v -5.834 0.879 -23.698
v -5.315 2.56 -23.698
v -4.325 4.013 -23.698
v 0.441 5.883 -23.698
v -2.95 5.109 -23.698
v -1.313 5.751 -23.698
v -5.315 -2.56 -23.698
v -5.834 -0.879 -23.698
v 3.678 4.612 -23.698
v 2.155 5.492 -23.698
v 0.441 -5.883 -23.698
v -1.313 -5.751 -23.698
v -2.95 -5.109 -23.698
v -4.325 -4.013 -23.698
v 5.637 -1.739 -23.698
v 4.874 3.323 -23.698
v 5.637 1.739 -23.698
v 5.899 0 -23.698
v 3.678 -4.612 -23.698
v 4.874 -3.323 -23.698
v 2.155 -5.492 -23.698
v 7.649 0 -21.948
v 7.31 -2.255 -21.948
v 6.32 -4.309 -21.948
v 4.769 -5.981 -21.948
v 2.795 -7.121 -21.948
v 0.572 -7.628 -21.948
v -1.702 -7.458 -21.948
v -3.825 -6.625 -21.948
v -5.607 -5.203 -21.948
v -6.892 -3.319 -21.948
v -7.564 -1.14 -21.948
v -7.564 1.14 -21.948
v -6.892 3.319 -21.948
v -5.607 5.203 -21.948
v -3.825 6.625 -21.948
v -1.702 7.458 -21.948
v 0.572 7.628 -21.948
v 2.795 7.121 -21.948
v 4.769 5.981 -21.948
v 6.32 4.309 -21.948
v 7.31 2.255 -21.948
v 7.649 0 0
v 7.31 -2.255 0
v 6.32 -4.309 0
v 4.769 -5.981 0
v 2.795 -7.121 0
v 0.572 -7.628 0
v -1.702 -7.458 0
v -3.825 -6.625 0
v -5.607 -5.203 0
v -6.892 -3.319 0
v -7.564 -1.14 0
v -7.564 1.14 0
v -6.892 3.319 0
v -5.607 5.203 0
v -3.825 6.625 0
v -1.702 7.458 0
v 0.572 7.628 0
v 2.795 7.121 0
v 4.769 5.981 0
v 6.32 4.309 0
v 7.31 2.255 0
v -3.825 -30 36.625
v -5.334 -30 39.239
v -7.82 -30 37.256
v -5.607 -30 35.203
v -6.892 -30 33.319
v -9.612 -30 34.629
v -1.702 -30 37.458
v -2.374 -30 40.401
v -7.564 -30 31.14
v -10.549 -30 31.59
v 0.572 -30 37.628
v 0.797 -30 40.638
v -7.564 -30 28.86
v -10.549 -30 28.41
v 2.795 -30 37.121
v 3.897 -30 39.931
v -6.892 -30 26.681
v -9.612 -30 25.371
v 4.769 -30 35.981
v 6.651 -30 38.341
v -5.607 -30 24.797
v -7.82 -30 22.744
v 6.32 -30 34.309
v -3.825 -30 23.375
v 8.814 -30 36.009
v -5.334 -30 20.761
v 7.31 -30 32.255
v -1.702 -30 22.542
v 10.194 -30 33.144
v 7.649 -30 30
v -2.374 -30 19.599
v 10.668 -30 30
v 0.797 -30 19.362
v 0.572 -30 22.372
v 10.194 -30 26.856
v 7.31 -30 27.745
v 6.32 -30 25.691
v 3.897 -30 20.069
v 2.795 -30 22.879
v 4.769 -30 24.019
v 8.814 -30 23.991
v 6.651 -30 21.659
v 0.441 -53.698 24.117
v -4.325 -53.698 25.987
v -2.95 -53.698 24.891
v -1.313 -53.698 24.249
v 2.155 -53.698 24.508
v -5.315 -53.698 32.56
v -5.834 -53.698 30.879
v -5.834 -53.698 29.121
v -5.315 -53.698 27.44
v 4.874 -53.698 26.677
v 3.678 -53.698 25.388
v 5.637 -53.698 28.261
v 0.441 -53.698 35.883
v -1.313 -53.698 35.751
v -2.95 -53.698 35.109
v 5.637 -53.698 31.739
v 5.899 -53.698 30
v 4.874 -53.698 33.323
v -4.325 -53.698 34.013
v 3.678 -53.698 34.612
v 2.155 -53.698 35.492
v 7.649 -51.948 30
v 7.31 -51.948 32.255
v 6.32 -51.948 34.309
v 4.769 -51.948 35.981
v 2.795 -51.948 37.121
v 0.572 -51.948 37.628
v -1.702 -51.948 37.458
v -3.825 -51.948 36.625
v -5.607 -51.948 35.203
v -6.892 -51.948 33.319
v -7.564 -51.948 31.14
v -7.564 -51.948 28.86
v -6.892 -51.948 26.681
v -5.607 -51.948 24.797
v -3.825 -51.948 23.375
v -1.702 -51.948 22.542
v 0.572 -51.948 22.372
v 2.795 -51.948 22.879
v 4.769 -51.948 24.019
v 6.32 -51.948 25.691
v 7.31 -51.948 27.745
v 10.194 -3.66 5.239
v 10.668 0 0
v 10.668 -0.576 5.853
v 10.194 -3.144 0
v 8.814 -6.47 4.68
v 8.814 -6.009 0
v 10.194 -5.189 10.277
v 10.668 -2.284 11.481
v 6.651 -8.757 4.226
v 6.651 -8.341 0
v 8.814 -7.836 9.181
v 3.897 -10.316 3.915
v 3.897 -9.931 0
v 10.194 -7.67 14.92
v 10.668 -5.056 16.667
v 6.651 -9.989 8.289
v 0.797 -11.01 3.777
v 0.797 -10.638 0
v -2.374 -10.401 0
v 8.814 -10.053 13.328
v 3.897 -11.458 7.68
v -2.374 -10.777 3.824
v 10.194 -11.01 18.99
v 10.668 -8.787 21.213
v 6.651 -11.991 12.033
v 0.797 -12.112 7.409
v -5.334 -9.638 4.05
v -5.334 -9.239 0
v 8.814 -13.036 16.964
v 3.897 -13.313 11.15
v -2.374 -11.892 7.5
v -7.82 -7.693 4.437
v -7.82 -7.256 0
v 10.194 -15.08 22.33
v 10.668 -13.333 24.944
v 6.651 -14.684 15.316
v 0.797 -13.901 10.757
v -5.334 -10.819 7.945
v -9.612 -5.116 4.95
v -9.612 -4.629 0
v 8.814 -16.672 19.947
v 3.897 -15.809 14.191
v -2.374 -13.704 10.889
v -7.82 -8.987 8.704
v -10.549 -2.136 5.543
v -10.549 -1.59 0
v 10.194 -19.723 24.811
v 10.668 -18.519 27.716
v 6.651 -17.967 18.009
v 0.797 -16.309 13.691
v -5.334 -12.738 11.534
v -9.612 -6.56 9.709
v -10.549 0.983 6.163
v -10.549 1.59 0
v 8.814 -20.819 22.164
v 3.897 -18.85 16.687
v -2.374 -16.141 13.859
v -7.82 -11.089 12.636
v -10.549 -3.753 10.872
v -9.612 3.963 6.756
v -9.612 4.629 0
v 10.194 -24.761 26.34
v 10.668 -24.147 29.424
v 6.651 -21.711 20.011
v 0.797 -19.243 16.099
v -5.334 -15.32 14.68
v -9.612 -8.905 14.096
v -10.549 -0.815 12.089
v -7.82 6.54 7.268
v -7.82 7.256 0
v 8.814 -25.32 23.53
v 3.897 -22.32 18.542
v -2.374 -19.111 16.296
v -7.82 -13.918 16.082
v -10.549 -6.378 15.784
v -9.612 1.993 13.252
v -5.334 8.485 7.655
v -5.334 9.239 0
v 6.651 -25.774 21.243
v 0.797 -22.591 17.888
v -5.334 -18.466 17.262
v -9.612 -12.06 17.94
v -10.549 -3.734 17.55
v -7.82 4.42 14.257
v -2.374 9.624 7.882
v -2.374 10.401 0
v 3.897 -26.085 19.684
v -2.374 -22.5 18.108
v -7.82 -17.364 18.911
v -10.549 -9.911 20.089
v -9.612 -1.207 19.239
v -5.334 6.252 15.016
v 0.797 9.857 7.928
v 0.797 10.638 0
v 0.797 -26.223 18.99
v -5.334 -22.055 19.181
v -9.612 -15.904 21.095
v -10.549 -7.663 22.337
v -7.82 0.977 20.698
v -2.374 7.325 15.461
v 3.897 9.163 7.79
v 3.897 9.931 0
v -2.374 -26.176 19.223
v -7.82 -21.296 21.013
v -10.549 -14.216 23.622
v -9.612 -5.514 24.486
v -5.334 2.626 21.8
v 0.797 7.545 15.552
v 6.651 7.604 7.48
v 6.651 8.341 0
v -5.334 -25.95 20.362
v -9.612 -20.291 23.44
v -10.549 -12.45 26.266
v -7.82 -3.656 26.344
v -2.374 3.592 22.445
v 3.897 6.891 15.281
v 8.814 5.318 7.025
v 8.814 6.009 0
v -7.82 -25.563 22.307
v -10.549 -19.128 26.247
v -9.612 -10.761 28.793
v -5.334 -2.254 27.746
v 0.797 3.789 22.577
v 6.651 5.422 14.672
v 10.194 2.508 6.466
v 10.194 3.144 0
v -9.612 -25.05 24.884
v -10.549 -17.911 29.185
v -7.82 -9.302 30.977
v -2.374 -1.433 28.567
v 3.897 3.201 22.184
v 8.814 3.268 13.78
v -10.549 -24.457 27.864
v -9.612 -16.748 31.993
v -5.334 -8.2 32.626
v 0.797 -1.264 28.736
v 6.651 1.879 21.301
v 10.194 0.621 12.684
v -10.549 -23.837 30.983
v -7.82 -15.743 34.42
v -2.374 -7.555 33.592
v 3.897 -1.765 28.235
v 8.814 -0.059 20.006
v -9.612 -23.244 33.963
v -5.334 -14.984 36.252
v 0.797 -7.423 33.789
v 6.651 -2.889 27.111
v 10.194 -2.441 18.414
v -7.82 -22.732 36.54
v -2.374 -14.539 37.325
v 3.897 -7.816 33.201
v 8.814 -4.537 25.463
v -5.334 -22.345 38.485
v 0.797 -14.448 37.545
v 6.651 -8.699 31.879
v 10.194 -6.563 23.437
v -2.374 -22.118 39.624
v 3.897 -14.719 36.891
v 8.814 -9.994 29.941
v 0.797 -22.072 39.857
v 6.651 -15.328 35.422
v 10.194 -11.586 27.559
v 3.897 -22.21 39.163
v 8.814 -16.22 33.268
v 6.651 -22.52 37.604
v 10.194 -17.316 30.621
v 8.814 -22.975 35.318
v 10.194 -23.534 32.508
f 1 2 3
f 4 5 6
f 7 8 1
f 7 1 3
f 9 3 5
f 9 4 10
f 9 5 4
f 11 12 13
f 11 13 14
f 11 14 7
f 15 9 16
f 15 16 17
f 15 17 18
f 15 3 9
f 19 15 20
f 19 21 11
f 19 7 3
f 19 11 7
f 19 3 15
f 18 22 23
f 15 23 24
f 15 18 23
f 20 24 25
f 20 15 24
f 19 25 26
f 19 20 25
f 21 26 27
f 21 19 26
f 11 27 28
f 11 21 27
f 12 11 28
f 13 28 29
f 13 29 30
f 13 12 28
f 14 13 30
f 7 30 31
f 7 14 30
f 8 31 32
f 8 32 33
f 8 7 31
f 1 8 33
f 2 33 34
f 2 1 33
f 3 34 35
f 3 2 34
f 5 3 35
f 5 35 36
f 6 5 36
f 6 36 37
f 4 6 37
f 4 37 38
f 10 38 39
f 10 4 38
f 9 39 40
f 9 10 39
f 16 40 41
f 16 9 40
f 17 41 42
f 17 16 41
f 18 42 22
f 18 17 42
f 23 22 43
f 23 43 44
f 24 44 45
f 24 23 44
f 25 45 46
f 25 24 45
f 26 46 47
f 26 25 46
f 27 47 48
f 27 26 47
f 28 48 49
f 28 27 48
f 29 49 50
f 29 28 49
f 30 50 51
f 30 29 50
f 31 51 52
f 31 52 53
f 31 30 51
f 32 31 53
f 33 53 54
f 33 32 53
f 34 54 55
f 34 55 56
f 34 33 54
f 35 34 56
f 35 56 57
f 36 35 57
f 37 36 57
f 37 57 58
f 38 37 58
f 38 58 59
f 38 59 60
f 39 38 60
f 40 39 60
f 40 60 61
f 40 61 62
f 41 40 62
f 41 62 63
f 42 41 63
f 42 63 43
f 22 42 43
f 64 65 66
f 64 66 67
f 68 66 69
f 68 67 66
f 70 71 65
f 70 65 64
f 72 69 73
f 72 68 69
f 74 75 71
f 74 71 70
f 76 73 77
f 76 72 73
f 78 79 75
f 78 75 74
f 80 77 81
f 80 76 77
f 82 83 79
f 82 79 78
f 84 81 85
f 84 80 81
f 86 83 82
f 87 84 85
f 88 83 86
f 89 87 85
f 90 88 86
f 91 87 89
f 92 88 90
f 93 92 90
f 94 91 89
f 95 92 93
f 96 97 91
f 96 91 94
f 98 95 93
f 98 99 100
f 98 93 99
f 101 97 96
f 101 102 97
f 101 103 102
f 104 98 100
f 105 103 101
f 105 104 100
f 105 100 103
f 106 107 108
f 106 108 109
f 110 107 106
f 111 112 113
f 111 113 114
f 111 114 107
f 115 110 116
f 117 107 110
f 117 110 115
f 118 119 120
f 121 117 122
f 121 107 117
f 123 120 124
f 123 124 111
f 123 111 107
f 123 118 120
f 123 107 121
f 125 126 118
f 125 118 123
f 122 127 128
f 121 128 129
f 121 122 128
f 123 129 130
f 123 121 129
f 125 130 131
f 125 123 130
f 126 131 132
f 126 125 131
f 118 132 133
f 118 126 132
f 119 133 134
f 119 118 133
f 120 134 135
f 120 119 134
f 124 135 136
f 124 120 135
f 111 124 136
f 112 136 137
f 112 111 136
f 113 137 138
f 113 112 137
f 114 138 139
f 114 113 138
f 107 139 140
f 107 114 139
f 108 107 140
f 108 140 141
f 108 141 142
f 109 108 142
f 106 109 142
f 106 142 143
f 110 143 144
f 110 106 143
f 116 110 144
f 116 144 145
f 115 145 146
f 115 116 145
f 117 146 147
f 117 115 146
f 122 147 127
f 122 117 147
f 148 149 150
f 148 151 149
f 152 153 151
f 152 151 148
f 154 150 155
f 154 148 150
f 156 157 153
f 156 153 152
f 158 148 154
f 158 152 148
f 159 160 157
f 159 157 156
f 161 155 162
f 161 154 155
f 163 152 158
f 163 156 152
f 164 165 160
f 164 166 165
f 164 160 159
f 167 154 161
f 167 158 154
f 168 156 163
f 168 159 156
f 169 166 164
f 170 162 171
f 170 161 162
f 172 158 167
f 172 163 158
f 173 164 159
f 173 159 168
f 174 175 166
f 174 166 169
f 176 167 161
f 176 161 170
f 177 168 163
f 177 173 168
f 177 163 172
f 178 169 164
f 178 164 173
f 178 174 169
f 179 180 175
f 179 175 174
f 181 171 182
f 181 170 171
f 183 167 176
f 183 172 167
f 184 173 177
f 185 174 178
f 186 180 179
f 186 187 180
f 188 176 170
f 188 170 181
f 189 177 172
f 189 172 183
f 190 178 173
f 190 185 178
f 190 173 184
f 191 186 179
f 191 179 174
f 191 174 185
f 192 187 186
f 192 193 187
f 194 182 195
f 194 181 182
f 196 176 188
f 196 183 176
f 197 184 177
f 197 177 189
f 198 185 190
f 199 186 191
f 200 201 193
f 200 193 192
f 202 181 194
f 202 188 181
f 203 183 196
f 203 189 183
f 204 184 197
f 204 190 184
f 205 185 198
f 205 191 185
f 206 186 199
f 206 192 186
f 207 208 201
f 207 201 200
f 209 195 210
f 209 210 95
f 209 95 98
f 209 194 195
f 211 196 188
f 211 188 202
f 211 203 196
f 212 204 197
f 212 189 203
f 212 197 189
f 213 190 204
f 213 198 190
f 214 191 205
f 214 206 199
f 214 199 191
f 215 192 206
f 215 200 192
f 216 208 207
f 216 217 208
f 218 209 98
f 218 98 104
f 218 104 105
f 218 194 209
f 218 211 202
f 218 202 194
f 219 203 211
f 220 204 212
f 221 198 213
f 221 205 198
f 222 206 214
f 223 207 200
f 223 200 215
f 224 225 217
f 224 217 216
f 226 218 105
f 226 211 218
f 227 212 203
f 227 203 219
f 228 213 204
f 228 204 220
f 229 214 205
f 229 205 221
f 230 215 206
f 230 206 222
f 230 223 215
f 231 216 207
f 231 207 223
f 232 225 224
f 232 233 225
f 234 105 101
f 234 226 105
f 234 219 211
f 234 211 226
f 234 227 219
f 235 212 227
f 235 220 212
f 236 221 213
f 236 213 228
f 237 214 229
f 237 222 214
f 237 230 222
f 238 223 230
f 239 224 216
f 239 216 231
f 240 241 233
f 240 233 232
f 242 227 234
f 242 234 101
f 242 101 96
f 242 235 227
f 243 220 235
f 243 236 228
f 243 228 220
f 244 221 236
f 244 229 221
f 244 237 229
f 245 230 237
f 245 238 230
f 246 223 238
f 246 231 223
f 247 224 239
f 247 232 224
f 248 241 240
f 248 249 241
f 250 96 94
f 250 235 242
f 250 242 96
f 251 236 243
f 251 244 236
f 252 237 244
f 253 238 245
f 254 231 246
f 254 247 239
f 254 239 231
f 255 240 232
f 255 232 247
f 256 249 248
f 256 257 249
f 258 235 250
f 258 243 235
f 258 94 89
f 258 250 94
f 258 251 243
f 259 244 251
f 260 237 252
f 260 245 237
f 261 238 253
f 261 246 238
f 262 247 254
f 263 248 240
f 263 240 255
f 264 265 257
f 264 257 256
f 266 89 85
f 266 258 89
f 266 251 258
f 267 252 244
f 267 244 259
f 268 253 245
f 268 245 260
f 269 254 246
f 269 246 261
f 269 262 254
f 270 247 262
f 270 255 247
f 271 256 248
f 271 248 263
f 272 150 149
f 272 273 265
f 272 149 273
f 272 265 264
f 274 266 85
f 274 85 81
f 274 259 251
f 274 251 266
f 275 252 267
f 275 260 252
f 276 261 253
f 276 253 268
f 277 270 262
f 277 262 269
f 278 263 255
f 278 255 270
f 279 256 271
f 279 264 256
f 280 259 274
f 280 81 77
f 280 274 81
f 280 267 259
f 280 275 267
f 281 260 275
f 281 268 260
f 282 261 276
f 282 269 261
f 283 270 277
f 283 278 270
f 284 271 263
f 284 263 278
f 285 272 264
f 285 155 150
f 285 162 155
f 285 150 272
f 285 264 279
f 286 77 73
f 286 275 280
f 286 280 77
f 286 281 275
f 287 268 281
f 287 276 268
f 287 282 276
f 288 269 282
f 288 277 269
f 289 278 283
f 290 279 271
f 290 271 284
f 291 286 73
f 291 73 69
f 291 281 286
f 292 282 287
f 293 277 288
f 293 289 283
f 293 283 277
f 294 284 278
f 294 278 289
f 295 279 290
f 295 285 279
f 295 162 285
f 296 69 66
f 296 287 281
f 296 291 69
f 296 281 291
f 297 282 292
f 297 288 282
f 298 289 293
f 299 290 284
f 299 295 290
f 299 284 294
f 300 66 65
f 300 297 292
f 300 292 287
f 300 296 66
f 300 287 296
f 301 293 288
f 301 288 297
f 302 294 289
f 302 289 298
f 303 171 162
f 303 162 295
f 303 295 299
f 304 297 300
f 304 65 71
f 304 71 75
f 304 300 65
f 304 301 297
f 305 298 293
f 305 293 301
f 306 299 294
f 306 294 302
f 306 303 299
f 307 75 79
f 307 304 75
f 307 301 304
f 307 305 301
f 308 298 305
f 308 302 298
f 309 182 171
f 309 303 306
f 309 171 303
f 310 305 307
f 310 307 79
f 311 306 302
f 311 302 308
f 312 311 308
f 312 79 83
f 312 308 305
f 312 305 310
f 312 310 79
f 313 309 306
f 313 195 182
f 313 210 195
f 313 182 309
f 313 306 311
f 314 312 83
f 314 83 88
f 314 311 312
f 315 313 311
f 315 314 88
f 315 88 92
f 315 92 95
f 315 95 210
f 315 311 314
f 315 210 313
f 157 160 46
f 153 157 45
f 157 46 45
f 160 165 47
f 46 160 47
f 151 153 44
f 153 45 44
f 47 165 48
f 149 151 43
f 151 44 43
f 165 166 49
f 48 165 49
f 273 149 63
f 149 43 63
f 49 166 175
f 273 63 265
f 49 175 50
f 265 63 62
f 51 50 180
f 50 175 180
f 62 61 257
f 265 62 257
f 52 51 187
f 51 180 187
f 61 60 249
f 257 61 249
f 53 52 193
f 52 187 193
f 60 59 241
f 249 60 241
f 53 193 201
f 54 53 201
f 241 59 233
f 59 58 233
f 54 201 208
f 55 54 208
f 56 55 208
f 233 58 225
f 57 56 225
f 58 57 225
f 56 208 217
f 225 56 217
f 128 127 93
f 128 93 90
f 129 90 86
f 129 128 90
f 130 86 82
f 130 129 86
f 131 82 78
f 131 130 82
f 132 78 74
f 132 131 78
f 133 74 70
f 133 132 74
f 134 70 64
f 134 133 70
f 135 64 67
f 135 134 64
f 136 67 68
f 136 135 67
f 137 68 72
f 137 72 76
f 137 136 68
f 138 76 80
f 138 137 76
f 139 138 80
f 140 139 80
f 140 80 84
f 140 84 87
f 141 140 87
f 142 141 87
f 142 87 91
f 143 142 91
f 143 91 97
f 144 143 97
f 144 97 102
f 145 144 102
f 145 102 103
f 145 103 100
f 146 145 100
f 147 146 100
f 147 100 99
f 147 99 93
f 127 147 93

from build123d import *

# Parameters (mm, degrees)
F1_R      = 10.668
F3_R      = 7.8994
F4_DEPTH  = 23.6982
F5_R      = 7.8994
F6_DEPTH  = 23.6982
F7_SIZE   = 2
F8_R      = 7.8994
F8_R_2    = 7.6494
F9_DEPTH  = 23.6982
F10_R     = 7.8994
F10_R_2   = 7.6494
F11_DEPTH = 23.6982


with BuildPart() as f2:
    # F2: sweep along a path in F0
    with BuildLine(Plane.YZ) as f2_path:
        ThreePointArc((0, 0), (-8.7867965644, 21.2132034356), (-30, 30))
    # F1 (on Top) → F2 (sweep)
    with BuildSketch(Plane.XY):
        Circle(F1_R)
    sweep(path=f2_path.line)

    # F3 (on face) → F4 (join)
    with BuildSketch(Plane(origin=(0, 0, 0), x_dir=(1, 0, 0), z_dir=(0, 0, -1))):
        Circle(F3_R)
    extrude(amount=F4_DEPTH)

    # F5 (on face) → F6 (join)
    with BuildSketch(Plane.XZ.offset(30)):
        with Locations((0, 30)):
            Circle(F5_R)
    extrude(amount=F6_DEPTH)

    # F7
    f7_edges = [f2.edges().sort_by_distance(p)[0] for p in [
        (-7.8994, 0, -23.6982),
        (-7.8994, -53.6982, 30),
    ]]
    chamfer(f7_edges, length=F7_SIZE)

    # F8 (on face) → F9 (cut, through all)
    with BuildSketch(Plane(origin=(0, 0, -23.6982), x_dir=(1, 0, 0), z_dir=(0, 0, -1))):
        Circle(F8_R)
        Circle(F8_R_2, mode=Mode.SUBTRACT)
    extrude(amount=-F9_DEPTH, mode=Mode.SUBTRACT)

    # F10 (on face) → F11 (cut, through all)
    with BuildSketch(Plane.XZ.offset(53.6982)):
        with Locations((0, 30)):
            Circle(F10_R)
        with Locations((0, 30)):
            Circle(F10_R_2, mode=Mode.SUBTRACT)
    extrude(amount=-F11_DEPTH, mode=Mode.SUBTRACT)


solid = f2.part
